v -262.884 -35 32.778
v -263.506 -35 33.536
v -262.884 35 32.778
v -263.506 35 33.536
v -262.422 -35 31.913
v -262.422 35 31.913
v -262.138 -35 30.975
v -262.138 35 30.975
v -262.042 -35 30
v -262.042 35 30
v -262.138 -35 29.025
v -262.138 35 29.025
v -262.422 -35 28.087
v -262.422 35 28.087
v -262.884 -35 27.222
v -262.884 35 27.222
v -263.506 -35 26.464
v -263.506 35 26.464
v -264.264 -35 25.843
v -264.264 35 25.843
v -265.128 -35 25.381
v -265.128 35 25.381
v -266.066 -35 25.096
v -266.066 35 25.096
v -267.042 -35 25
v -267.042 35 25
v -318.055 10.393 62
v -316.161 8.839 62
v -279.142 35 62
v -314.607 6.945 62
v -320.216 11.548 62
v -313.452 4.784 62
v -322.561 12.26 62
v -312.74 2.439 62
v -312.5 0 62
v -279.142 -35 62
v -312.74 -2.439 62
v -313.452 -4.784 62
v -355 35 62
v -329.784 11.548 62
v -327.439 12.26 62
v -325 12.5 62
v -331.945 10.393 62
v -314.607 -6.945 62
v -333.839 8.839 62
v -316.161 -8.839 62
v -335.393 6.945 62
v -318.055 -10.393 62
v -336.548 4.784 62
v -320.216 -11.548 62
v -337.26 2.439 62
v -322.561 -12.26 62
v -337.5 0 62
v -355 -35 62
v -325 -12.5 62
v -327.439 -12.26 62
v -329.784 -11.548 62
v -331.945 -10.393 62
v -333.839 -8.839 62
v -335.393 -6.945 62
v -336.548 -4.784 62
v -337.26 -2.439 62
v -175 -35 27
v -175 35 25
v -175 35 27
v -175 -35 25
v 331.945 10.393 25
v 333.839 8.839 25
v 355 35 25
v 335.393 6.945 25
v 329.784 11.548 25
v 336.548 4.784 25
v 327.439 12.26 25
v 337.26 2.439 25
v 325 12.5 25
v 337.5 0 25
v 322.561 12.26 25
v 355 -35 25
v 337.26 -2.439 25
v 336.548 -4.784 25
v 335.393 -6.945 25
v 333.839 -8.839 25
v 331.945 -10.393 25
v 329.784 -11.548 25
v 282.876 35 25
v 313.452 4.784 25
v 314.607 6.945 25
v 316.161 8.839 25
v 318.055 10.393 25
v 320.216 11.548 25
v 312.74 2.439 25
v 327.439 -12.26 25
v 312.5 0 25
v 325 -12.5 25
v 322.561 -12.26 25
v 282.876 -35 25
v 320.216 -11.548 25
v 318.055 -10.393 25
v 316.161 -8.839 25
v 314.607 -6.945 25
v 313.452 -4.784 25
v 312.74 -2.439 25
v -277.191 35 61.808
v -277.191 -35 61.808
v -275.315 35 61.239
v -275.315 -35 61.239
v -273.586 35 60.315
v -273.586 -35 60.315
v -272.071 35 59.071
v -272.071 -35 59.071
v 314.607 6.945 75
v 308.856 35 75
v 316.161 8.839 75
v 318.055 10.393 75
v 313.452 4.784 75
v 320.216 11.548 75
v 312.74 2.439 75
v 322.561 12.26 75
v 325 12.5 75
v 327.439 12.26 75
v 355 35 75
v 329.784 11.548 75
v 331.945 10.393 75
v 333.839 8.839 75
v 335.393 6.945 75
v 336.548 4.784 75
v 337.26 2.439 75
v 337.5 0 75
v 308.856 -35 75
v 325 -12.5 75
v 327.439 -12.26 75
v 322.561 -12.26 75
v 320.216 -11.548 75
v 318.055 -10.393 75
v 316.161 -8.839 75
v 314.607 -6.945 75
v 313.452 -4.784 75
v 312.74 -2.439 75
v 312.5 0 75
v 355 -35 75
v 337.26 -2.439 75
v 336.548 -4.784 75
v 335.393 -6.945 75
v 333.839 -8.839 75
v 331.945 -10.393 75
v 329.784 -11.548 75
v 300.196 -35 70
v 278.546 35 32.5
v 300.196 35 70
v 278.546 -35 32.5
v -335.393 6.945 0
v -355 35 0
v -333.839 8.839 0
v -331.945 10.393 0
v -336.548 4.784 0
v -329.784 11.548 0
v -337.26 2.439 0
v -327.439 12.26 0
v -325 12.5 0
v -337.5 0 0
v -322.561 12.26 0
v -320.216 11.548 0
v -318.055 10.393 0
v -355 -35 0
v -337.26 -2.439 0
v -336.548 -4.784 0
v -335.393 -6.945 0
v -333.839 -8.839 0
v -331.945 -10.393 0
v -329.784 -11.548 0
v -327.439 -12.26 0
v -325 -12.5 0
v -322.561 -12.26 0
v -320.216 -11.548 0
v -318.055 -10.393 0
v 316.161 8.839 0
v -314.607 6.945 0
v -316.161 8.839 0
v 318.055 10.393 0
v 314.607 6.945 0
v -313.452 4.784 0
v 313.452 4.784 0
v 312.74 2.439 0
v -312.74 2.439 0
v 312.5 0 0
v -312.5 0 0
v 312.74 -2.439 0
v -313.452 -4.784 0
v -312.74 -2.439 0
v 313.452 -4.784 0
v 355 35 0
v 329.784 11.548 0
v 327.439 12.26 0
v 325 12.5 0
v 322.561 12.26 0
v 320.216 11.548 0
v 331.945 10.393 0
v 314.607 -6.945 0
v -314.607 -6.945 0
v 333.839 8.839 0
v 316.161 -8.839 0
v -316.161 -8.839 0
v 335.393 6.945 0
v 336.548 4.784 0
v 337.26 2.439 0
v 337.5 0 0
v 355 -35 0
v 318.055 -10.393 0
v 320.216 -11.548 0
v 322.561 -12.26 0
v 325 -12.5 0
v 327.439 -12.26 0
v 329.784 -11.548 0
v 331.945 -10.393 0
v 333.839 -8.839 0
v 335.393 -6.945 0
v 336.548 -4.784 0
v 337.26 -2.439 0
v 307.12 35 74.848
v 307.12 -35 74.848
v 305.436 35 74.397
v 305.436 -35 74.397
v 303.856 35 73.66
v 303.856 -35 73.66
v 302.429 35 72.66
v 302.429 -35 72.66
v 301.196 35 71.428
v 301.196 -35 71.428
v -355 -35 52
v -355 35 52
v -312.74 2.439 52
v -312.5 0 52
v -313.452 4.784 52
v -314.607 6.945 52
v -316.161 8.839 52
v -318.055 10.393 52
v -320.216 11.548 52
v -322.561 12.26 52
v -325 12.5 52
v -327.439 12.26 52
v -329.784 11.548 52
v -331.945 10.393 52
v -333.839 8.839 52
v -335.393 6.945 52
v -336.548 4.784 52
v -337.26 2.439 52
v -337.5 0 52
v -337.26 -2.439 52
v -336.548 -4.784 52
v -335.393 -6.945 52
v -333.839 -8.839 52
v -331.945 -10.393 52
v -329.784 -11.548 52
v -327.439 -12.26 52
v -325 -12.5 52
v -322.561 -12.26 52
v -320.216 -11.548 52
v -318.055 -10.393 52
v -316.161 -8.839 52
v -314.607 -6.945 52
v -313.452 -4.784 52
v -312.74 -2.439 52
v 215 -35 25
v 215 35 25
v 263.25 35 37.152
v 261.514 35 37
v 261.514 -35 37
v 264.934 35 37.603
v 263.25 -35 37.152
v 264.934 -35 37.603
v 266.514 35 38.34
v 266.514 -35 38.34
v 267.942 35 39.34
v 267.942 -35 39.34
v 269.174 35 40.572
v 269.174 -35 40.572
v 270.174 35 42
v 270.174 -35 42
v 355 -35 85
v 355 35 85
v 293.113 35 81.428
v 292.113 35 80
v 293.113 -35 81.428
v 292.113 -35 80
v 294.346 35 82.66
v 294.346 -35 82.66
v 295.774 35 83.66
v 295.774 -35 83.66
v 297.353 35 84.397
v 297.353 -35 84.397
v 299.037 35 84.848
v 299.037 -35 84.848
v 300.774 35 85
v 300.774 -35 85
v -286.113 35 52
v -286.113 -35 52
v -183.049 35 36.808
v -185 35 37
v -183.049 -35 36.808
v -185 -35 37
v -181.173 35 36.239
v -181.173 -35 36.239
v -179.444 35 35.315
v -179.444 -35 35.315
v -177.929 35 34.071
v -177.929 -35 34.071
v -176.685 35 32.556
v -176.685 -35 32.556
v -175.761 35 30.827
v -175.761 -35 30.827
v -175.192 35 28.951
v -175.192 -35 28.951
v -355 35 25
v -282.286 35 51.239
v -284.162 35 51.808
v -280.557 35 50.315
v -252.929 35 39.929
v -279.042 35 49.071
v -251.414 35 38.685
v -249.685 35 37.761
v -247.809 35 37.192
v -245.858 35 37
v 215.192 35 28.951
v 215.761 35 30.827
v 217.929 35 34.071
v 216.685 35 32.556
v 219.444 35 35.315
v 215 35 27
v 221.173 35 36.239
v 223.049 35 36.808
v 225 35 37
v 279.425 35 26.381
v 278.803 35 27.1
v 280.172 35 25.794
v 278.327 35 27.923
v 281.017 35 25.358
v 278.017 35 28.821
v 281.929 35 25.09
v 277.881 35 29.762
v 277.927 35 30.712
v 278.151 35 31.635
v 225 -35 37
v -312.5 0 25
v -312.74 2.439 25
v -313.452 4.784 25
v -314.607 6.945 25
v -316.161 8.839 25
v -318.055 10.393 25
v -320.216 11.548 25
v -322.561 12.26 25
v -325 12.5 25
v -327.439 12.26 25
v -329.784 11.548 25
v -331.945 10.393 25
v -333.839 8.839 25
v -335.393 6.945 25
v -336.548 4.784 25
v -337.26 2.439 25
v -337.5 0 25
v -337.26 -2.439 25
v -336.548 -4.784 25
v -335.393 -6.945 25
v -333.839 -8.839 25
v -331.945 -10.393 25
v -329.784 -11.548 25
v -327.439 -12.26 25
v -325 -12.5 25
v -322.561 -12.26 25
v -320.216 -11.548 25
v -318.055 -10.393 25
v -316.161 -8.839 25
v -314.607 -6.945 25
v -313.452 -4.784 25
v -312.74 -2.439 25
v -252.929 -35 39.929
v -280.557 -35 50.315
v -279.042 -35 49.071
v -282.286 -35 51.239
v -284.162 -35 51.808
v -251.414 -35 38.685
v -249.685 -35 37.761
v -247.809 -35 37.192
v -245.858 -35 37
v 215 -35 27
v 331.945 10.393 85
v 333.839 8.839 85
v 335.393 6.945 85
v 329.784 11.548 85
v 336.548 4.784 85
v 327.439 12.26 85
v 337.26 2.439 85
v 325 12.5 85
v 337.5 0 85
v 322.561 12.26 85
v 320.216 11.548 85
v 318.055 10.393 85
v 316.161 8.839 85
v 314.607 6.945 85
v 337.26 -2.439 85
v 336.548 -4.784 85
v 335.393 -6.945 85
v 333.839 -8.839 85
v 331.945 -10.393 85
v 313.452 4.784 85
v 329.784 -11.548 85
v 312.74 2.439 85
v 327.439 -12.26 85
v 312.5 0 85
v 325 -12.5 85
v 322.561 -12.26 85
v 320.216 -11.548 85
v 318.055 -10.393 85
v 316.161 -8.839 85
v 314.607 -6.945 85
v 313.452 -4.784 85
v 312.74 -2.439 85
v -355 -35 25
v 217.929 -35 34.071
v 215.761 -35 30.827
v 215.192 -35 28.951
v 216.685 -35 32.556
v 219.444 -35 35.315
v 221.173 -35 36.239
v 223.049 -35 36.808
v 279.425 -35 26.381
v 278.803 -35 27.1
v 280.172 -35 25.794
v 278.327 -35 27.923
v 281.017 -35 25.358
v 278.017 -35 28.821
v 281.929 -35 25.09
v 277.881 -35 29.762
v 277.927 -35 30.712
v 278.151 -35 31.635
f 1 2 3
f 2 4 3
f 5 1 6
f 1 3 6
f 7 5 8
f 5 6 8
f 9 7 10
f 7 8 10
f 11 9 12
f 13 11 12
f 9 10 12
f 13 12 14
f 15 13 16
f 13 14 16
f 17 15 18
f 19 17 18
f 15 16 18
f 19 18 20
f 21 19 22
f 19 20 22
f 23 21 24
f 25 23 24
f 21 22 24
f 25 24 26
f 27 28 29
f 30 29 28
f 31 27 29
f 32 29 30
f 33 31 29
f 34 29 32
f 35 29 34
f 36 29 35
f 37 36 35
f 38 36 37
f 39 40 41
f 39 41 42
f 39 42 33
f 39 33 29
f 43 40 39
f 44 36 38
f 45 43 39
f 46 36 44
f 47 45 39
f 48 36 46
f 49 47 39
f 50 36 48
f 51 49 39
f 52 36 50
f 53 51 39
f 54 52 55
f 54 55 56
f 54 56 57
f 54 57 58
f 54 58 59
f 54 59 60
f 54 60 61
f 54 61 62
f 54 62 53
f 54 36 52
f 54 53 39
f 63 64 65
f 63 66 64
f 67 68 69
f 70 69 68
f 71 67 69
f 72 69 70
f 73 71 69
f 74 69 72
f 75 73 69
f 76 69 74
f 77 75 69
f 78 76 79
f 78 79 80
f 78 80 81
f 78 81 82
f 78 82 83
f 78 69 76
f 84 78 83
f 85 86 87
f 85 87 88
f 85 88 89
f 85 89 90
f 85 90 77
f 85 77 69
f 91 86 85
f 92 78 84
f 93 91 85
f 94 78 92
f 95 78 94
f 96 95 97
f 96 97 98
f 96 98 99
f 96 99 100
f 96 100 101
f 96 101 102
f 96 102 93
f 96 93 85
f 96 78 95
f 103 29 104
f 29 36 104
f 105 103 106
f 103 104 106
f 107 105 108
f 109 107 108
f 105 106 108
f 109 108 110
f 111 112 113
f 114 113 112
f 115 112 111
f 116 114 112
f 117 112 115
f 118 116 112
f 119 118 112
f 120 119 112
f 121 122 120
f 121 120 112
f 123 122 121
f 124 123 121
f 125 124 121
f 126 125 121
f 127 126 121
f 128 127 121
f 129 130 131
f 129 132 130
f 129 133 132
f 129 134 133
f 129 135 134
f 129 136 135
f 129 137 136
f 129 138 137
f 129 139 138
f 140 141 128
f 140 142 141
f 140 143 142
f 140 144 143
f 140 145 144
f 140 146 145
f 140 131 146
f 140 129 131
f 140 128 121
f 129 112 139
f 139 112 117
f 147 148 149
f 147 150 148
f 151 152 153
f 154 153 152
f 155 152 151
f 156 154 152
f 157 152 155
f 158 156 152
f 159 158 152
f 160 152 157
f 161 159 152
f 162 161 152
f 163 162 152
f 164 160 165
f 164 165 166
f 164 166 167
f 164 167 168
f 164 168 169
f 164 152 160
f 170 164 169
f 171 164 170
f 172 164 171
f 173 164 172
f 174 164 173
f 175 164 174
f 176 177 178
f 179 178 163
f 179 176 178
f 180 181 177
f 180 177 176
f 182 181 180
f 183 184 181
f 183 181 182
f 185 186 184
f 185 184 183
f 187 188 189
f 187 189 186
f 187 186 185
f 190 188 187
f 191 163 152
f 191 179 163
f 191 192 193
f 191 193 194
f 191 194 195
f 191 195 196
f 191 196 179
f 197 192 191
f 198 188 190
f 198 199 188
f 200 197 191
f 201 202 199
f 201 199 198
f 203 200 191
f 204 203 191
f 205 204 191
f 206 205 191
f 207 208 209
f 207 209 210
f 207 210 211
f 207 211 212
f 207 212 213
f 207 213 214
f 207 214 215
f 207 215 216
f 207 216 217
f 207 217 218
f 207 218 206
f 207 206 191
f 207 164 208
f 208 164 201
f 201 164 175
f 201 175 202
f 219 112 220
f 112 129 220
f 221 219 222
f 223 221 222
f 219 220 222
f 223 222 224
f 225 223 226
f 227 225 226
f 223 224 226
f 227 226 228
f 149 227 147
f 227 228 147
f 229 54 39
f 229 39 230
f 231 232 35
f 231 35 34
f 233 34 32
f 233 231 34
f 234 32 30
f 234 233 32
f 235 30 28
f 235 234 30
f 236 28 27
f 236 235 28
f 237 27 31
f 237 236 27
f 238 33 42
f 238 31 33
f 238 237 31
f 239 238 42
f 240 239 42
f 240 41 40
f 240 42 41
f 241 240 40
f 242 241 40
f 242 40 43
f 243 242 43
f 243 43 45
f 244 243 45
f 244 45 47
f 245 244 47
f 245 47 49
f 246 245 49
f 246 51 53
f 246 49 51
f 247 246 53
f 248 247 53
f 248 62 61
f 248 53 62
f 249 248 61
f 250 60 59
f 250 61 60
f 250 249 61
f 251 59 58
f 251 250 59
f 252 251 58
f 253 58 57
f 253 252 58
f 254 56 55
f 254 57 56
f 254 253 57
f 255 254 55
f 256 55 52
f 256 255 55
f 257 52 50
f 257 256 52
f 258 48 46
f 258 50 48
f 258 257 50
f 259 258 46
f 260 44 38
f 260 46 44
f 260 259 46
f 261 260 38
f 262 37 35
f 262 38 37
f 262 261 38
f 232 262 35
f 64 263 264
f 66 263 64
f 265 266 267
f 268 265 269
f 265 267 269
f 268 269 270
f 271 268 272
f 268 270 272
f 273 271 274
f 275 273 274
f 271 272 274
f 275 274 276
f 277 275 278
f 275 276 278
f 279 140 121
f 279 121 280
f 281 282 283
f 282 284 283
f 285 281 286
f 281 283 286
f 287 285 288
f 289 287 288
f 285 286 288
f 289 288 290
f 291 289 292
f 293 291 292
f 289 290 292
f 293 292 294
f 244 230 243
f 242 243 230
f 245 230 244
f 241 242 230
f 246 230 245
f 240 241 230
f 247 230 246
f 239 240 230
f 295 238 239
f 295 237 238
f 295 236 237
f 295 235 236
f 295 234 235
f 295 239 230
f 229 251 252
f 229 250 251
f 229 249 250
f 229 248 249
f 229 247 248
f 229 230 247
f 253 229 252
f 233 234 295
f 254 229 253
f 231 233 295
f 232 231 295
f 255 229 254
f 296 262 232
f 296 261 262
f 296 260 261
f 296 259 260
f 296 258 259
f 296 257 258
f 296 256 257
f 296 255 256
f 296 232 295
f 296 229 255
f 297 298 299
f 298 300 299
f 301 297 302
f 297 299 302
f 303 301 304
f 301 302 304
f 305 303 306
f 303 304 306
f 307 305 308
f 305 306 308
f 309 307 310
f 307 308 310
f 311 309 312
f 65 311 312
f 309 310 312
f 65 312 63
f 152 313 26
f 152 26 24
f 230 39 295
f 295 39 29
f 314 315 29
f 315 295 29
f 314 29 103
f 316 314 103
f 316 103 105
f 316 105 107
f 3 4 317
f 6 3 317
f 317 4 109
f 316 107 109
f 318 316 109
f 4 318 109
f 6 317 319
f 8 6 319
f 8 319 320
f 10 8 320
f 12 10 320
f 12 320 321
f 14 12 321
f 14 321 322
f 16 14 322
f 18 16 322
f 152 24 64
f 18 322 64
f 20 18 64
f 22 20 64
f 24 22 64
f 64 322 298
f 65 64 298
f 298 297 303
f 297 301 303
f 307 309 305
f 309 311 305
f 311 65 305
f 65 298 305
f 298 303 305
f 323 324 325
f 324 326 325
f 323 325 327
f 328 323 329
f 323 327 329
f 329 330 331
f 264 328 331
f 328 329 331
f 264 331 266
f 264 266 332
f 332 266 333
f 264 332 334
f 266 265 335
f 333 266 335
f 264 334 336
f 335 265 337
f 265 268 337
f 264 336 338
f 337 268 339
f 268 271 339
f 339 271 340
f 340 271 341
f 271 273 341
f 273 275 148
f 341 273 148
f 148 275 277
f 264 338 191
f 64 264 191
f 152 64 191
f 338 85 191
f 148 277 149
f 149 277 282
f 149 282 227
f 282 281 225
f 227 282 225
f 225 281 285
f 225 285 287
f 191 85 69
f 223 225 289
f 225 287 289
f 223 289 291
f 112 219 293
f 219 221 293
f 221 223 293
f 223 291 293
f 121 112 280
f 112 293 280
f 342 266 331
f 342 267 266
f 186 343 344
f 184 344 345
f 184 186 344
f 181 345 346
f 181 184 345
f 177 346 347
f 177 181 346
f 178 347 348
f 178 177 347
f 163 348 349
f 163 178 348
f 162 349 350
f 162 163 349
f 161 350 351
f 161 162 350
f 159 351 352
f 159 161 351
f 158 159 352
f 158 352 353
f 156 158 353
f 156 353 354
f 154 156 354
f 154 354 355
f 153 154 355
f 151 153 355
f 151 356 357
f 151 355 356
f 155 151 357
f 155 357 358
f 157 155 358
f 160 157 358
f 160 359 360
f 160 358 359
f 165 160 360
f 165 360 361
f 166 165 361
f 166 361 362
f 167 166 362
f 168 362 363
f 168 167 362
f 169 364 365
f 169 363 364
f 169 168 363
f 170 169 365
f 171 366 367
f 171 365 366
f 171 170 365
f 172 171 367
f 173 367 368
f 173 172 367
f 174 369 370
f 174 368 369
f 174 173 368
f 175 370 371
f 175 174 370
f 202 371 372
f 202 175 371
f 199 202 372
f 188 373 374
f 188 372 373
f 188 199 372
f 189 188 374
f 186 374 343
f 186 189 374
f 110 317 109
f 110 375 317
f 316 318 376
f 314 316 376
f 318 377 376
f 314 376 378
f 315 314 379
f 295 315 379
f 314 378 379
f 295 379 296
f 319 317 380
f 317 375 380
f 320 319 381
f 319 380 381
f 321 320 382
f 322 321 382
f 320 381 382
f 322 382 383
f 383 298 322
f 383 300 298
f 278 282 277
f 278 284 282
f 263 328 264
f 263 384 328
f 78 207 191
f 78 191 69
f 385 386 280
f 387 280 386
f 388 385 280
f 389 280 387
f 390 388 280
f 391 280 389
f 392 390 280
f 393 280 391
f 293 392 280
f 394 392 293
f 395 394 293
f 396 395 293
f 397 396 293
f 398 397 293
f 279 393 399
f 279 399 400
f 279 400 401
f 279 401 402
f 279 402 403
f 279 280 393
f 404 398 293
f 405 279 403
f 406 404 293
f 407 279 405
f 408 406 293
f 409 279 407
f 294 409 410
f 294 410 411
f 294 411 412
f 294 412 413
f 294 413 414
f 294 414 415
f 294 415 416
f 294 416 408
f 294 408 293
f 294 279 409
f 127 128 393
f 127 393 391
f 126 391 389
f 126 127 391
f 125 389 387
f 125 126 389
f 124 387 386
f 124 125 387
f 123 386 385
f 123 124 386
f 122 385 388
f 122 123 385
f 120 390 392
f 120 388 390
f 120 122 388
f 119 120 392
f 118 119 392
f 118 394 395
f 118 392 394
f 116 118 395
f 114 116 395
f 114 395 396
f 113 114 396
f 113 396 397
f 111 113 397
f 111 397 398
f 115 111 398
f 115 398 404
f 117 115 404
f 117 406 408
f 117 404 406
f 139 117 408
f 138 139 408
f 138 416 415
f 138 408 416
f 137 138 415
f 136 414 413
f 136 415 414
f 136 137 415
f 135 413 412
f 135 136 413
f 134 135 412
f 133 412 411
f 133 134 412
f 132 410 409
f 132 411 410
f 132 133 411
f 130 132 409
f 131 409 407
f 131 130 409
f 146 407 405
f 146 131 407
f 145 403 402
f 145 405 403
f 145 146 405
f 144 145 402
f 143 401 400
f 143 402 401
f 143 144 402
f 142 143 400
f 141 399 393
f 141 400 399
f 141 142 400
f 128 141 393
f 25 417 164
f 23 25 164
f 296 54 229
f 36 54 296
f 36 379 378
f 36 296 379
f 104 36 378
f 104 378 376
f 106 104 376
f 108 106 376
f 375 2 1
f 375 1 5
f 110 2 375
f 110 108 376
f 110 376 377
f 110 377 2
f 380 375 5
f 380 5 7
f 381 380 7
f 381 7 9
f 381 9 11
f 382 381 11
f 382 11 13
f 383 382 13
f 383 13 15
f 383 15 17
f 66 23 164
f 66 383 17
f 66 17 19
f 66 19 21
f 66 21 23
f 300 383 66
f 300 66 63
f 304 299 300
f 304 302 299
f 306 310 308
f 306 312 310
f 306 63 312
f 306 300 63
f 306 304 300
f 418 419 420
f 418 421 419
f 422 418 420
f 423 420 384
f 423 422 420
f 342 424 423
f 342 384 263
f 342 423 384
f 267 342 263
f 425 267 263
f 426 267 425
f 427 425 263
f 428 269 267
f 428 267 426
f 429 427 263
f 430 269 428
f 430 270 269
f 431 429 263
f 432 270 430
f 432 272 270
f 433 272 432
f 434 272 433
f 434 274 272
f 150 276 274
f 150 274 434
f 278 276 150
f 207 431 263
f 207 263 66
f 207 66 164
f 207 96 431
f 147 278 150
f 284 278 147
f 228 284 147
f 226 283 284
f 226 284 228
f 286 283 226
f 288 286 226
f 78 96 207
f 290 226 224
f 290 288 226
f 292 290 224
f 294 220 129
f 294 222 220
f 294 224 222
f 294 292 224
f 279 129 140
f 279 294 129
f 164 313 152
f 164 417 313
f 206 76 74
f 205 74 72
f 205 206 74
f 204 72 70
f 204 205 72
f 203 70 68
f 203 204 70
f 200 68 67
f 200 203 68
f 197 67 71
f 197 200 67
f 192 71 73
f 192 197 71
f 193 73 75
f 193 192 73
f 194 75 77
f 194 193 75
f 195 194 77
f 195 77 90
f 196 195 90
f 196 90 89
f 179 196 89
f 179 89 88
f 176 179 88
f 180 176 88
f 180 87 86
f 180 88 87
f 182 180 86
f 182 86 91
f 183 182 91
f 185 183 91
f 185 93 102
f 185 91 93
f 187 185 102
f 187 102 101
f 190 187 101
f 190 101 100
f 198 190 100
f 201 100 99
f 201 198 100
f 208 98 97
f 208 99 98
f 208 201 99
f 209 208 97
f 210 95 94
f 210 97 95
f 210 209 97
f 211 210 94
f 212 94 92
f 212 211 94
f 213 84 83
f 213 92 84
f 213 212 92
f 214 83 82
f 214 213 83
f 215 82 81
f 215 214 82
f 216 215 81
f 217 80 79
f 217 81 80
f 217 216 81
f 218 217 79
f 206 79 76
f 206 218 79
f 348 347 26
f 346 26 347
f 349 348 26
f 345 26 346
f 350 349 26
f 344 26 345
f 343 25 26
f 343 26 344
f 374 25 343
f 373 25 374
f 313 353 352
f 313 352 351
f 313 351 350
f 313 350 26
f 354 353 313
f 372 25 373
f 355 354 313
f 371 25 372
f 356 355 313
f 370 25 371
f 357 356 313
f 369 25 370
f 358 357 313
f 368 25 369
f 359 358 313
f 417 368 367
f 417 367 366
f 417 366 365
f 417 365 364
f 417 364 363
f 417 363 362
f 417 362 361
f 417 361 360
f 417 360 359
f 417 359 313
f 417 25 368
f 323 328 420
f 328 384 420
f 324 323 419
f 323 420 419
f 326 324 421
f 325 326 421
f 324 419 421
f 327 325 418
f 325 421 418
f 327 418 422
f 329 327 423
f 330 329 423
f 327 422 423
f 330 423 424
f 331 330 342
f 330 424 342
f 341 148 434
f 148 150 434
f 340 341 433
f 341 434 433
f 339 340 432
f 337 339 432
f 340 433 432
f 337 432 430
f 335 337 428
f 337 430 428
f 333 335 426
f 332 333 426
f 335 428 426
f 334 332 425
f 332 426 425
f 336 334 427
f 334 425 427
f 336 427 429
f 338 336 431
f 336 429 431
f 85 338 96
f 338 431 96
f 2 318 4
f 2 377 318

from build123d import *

# Parameters (mm, degrees)
F1_DEPTH = 35
F2_R     = 10
F3_R     = 5
F4_R     = 12.5
F5_DEPTH = 85.001


with BuildPart() as f1:
    # F0 (on Front) → F1 (new body, symmetric)
    with BuildSketch(Plane.XZ):
        Polygon((-355, 0), (355, 0), (355, 25), (274.21539, 25), (215, 25), (-175, 25), (-254.970563, 25), (-355, 25), align=None)
        Polygon((215, 25), (274.21539, 25), (303.082904, 75), (355, 75), (355, 85), (295, 85), (267.287187, 37), (215, 37), align=None)
        Polygon((-281.970563, 52), (-254.970563, 25), (-175, 25), (-175, 37), (-250, 37), (-275, 62), (-355, 62), (-355, 52), align=None)
    extrude(amount=F1_DEPTH, both=True)

    # F2
    f2_edges = [f1.edges().sort_by_distance(p)[0] for p in [
        (-175, 0, 37),
        (-250, 0, 37),
        (-281.970563, 0, 52),
        (-275, 0, 62),
        (267.287187, 0, 37),
        (295, 0, 85),
        (303.082904, 0, 75),
        (215, 0, 37),
    ]]
    fillet(f2_edges, radius=F2_R)

    # F3
    f3_edges = [f1.edges().sort_by_distance(p)[0] for p in [
        (-254.970563, 0, 25),
        (274.21539, 0, 25),
    ]]
    fillet(f3_edges, radius=F3_R)

    # F4 (on Top) → F5 (cut, through all)
    with BuildSketch(Plane.XY):
        with Locations((-325, 0)):
            Circle(F4_R)
        with Locations((325, 0)):
            Circle(F4_R)
    extrude(amount=F5_DEPTH, mode=Mode.SUBTRACT)


solid = f1.part
